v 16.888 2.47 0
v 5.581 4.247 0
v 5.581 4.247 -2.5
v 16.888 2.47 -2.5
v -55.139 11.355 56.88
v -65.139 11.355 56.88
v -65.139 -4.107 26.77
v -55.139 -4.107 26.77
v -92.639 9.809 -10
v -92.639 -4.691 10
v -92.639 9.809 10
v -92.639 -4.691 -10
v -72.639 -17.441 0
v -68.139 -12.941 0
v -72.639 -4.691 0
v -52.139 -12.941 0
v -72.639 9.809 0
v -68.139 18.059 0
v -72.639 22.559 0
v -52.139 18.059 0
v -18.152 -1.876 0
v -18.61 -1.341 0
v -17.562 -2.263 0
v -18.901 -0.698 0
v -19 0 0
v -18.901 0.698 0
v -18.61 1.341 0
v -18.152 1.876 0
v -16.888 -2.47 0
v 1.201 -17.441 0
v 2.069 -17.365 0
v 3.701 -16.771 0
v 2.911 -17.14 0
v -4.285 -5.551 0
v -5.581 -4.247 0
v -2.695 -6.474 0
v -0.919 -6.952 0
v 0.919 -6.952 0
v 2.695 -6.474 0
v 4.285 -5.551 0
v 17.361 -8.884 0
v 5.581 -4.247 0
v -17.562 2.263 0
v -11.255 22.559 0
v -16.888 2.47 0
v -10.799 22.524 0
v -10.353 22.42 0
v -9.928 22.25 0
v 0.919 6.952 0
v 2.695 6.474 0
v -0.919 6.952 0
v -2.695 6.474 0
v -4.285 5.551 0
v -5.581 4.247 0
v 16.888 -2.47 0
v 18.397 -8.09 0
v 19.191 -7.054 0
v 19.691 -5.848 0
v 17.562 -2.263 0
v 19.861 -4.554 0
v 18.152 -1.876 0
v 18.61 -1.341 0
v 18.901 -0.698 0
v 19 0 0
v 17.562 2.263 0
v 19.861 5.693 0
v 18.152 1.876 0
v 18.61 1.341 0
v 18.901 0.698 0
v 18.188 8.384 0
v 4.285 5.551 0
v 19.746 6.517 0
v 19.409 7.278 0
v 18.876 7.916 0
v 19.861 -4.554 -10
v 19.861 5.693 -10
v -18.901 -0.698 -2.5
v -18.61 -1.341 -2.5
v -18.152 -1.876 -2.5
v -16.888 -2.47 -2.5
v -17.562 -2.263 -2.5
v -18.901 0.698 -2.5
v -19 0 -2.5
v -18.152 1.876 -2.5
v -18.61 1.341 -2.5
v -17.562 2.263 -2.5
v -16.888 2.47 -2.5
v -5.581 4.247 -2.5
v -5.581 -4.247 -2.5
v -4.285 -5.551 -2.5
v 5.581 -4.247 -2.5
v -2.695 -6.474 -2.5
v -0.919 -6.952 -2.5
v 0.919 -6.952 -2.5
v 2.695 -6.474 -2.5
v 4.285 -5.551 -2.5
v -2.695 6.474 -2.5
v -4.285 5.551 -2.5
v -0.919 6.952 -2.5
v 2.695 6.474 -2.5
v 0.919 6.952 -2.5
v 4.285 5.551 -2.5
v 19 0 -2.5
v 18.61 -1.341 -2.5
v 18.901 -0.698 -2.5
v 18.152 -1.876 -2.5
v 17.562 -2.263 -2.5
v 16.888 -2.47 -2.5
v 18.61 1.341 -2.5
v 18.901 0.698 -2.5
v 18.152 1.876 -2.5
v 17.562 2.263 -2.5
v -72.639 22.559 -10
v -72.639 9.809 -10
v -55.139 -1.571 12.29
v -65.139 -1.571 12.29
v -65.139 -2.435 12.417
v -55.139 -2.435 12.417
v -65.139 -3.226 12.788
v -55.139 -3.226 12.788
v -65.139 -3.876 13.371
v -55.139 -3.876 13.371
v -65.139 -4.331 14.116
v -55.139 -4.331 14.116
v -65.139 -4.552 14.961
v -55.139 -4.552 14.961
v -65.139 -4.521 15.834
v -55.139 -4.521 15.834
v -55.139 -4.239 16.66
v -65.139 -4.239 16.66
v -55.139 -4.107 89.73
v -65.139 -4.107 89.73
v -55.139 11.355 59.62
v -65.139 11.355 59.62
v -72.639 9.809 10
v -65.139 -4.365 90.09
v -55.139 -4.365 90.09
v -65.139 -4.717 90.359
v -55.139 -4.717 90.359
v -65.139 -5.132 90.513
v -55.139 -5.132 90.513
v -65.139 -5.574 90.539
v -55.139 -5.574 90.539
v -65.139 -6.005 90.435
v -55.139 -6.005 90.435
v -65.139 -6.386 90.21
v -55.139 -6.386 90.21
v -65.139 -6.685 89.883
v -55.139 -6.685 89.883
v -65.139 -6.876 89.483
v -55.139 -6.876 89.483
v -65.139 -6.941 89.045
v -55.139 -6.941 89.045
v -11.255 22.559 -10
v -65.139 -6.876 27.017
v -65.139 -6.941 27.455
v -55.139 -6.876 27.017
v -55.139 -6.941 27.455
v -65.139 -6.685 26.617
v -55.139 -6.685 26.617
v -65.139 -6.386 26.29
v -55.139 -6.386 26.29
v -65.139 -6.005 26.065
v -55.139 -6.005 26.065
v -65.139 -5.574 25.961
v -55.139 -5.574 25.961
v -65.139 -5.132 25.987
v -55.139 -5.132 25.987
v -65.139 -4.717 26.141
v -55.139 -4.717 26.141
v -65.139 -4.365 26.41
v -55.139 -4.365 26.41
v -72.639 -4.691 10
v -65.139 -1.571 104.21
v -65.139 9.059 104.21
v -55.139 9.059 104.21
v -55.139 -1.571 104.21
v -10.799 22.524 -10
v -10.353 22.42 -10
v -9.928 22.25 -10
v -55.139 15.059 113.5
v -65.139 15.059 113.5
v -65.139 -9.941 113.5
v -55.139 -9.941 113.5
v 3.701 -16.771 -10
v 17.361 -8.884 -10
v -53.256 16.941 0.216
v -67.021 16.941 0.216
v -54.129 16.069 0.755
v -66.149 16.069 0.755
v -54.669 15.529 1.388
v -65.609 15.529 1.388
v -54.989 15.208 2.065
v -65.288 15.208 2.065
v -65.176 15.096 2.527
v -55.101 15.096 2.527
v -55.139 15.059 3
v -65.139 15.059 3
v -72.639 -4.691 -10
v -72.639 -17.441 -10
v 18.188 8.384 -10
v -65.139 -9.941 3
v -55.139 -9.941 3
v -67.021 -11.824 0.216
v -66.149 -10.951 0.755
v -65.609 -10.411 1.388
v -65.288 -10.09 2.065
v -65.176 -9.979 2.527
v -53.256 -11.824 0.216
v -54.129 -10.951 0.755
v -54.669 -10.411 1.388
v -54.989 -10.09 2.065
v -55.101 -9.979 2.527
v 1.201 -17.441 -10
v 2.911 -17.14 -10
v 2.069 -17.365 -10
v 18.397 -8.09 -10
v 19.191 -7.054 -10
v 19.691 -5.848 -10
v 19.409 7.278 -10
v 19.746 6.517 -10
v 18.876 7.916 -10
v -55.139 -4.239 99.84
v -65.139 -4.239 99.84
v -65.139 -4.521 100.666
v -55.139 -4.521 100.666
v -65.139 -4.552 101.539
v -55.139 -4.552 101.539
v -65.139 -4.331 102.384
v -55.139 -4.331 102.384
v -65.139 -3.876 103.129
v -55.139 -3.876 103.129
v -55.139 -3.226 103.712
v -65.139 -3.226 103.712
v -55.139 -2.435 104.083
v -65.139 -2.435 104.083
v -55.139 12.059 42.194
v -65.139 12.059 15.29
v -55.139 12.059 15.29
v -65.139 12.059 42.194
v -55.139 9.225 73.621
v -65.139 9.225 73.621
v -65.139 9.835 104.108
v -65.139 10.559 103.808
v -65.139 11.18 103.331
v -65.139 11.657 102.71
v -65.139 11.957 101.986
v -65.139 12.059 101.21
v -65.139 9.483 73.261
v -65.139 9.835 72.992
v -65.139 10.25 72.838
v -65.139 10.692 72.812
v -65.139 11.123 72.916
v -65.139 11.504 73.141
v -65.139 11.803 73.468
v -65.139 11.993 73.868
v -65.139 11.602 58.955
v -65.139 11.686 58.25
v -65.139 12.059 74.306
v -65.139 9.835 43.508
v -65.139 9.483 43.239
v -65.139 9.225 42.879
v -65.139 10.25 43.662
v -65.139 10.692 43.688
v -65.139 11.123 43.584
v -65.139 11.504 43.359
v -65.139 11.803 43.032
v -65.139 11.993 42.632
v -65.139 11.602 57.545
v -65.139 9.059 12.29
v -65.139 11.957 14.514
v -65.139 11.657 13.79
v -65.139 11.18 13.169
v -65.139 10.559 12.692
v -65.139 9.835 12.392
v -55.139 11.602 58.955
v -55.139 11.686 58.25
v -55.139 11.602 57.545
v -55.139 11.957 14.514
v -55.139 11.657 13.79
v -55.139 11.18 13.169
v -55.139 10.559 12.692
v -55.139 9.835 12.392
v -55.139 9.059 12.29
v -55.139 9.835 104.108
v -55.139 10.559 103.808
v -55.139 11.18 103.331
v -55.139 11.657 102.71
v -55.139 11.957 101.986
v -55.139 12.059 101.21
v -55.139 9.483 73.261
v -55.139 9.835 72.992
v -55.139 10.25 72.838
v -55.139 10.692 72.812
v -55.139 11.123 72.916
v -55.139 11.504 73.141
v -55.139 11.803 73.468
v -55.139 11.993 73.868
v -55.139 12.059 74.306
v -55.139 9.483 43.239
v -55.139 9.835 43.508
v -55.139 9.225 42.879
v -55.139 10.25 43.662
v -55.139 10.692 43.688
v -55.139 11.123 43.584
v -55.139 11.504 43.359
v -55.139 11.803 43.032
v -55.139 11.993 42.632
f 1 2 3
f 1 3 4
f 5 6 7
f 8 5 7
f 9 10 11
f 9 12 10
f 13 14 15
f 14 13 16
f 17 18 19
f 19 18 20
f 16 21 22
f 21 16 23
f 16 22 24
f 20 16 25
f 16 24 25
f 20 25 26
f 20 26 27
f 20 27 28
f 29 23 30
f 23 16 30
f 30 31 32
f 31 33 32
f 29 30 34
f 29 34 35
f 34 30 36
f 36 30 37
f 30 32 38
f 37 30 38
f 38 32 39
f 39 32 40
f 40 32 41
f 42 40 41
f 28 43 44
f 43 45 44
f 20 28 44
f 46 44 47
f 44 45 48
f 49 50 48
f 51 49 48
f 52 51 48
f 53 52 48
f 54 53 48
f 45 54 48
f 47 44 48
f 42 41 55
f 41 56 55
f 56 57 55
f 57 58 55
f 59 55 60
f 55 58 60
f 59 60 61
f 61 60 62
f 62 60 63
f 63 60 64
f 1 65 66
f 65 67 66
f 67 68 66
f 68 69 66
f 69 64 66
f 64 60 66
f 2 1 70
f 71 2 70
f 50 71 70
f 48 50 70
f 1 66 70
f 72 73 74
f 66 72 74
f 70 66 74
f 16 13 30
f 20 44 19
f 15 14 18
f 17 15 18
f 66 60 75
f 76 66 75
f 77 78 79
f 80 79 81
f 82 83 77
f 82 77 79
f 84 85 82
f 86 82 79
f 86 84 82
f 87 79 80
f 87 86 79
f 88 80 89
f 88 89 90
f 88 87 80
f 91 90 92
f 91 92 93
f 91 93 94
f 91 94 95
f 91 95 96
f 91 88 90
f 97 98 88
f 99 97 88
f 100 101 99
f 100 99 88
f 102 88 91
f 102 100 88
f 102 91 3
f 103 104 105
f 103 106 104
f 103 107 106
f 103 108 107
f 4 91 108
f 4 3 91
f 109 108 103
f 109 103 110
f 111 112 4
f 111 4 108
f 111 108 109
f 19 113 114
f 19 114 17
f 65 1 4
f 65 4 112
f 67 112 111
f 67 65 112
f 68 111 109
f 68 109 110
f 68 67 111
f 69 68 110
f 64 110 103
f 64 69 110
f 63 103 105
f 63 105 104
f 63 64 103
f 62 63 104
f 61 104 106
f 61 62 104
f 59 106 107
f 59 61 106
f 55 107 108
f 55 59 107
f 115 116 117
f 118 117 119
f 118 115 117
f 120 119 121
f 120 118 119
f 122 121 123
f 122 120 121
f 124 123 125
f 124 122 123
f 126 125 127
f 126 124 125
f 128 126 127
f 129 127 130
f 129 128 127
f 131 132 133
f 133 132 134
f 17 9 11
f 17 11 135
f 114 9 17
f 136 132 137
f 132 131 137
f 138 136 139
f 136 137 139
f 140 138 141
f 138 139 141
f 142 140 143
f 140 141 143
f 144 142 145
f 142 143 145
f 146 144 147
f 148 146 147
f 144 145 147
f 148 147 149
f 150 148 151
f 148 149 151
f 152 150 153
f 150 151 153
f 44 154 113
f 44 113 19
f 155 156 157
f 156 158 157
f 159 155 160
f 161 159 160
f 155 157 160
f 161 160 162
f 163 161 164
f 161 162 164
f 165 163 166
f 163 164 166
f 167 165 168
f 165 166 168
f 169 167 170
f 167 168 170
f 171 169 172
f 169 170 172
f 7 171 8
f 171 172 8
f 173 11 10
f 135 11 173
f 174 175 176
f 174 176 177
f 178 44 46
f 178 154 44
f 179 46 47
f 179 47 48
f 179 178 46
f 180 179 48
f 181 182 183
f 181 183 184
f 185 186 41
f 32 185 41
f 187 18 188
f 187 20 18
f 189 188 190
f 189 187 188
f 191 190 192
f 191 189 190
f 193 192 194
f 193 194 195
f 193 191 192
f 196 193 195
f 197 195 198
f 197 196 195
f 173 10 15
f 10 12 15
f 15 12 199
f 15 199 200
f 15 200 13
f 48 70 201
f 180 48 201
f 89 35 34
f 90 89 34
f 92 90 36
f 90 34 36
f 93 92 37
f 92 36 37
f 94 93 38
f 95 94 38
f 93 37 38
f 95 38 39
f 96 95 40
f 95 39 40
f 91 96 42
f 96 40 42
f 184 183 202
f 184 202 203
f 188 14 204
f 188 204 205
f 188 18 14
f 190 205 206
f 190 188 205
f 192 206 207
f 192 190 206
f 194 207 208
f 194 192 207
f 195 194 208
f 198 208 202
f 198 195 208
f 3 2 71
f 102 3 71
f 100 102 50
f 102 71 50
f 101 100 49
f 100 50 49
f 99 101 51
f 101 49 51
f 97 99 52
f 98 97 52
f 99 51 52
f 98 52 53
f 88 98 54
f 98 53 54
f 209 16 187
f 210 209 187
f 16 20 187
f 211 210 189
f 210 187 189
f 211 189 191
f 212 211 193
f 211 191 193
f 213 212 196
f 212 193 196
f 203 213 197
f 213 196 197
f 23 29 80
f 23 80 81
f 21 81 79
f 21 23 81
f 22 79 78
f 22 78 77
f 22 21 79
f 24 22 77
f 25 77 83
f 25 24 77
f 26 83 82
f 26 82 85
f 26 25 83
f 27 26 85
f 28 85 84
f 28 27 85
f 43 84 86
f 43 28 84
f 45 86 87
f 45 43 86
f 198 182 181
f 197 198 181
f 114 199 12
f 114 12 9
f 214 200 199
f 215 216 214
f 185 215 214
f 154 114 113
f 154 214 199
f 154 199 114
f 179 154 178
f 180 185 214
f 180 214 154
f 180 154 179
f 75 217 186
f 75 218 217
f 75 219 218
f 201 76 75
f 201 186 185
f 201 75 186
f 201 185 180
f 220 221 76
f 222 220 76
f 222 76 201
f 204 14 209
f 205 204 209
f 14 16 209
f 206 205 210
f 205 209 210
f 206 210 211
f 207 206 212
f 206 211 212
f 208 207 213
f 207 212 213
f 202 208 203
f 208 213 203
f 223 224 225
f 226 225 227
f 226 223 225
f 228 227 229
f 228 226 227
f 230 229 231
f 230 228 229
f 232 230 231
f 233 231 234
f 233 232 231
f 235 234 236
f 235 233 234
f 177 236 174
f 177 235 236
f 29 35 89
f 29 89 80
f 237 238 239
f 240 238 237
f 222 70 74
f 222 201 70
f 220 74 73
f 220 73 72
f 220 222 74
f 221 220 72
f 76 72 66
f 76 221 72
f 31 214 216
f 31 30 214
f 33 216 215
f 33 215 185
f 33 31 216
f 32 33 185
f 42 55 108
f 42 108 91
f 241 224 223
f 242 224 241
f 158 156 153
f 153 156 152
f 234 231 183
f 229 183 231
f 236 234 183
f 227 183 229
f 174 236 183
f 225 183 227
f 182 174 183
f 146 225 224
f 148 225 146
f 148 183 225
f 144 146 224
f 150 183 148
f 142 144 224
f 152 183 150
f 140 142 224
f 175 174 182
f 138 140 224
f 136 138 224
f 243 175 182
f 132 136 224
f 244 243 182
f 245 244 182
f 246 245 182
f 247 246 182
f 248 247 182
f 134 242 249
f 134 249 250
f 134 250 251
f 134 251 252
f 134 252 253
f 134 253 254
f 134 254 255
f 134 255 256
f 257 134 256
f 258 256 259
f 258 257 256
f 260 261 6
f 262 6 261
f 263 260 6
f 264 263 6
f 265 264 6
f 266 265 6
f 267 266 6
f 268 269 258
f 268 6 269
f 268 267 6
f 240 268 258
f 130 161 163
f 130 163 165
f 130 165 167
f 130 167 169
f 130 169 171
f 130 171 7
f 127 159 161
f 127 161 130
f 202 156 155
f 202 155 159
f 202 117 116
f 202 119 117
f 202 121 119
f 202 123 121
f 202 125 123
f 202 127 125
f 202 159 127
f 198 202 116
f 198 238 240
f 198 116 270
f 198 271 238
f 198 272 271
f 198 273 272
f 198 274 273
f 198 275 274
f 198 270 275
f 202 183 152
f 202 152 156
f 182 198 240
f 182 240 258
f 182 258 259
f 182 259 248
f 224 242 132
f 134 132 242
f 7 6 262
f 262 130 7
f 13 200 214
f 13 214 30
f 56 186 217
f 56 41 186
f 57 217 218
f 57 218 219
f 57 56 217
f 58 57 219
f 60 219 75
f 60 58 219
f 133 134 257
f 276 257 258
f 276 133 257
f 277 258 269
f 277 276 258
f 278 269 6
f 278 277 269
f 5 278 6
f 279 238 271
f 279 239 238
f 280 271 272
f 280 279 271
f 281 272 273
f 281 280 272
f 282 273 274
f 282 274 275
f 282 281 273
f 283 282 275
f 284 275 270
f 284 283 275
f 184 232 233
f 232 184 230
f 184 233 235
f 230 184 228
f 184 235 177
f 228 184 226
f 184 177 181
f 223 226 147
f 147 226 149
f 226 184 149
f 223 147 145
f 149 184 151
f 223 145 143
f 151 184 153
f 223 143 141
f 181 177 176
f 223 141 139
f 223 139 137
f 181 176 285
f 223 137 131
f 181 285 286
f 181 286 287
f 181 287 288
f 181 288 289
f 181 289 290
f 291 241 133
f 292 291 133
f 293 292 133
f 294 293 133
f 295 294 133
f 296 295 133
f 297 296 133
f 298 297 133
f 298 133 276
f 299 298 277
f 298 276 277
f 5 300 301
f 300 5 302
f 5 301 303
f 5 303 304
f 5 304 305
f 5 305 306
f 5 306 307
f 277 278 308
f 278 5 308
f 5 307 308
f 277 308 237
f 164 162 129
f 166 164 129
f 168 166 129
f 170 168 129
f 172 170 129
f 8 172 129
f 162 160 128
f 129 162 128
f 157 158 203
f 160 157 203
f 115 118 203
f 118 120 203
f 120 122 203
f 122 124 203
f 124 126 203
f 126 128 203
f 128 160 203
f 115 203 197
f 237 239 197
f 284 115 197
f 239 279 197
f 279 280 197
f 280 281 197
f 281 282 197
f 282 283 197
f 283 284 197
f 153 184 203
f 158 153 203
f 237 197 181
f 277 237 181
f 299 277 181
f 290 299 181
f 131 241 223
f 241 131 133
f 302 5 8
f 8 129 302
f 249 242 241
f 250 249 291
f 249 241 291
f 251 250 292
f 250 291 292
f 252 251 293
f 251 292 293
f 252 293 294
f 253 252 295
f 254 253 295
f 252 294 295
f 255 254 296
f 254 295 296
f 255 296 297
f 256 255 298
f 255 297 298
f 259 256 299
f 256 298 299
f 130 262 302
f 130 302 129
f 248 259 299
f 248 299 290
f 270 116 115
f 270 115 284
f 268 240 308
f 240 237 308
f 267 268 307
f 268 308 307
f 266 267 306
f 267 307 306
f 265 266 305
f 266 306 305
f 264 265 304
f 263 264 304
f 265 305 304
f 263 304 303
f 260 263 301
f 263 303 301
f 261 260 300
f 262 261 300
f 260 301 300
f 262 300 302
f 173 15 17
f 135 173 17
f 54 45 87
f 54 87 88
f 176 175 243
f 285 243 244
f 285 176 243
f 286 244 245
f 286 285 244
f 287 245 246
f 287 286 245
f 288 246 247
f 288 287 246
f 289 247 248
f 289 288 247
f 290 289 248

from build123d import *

# Parameters (mm, degrees)
SKETCH3_W            = 42.5
SKETCH3_H            = 15
BOSS_EXTRUDE1_DEPTH  = 10
SKETCH2_R            = 7.012606221
CUT_EXTRUDE1_DEPTH   = 2.5
SKETCH11_W           = 42.5
SKETCH11_H           = 10
BOSS_EXTRUDE5_DEPTH  = 10
SKETCH14_W           = 42.5
SKETCH14_H           = 10
BOSS_EXTRUDE7_DEPTH  = 15
SKETCH20_W           = 10
SKETCH20_H           = 40
BOSS_EXTRUDE10_DEPTH = 50
SKETCH21_W           = 10
SKETCH21_H           = 25
BOSS_EXTRUDE11_DEPTH = 113.5
FILLET1_R            = 3
CHAMFER1_SIZE        = 15
CHAMFER1_SIZE2       = 30.41699103
FILLET2_R            = 3
CHAMFER2_SIZE        = 10
CHAMFER2_SIZE2       = 17.320508076
FILLET3_R            = 5
CUT_EXTRUDE2_DEPTH   = 144.583262507
FILLET4_R            = 3
FILLET5_R            = 1.5
SKETCH25_W           = 10
SKETCH25_H           = 14.5
BOSS_EXTRUDE12_DEPTH = 20
SKETCH26_W           = 20
SKETCH26_H           = 14.5
BOSS_EXTRUDE13_DEPTH = 10


with BuildPart() as part:
    # Sketch3 → Boss-Extrude1 (new body)
    with BuildSketch(Plane.XY):
        with Locations((-1.388845539, 0.05888455)):
            Rectangle(SKETCH3_W, SKETCH3_H)
    extrude(amount=-BOSS_EXTRUDE1_DEPTH)

    # Sketch2 → Cut-Extrude1 (cut)
    with BuildSketch(Plane.XY):
        Circle(SKETCH2_R)
        with BuildLine():
            Line((-16.888114198, 2.469689731), (-3.968626967, 4.5))
            ThreePointArc((-3.968626967, 4.5), (0, 6), (3.968626967, 4.5))
            Line((3.968626967, 4.5), (16.888114198, 2.469689731))
            ThreePointArc((16.888114198, 2.469689731), (19, 0), (16.888114198, -2.469689731))
            Line((16.888114198, -2.469689731), (3.968626967, -4.5))
            ThreePointArc((3.968626967, -4.5), (0, -6), (-3.968626967, -4.5))
            Line((-3.968626967, -4.5), (-16.888114198, -2.469689731))
            ThreePointArc((-16.888114198, -2.469689731), (-19, 0), (-16.888114198, 2.469689731))
        make_face()
    extrude(amount=-CUT_EXTRUDE1_DEPTH, mode=Mode.SUBTRACT)

    # Sketch11 → Boss-Extrude5 (add)
    with BuildSketch(Plane.XZ.offset(7.44111545)):
        with Locations((-1.388845539, -5)):
            Rectangle(SKETCH11_W, SKETCH11_H)
    extrude(amount=BOSS_EXTRUDE5_DEPTH)

    # Sketch14 → Boss-Extrude7 (add)
    with BuildSketch(Plane(origin=(0, 7.55888455, 0), x_dir=(1, 0, 0), z_dir=(0, 1, 0))):
        with Locations((-1.388845539, 5)):
            Rectangle(SKETCH14_W, SKETCH14_H)
    extrude(amount=BOSS_EXTRUDE7_DEPTH)

    # Sketch20 → Boss-Extrude10 (add)
    with BuildSketch(Plane.ZY.offset(22.638845539)):
        with Locations((-5, 2.55888455)):
            Rectangle(SKETCH20_W, SKETCH20_H)
    extrude(amount=BOSS_EXTRUDE10_DEPTH)

    # Sketch21 → Boss-Extrude11 (add)
    with BuildSketch(Plane.XY):
        with Locations((-60.138845539, 2.55888455)):
            Rectangle(SKETCH21_W, SKETCH21_H)
    extrude(amount=BOSS_EXTRUDE11_DEPTH)

    # Fillet1
    fillet1_edges = [part.edges().sort_by_distance(p)[0] for p in [
        (-65.138845539, 2.55888455, 0),
        (-60.138845539, -9.94111545, 0),
        (-55.138845539, 2.55888455, 0),
        (-60.138845539, 15.05888455, 0),
    ]]
    fillet(fillet1_edges, radius=FILLET1_R)

    # Chamfer1
    chamfer1_edges = [part.edges().sort_by_distance(p)[0] for p in [
        (19.861154461, 22.55888455, -5),
    ]]
    chamfer1_side = [part.faces().sort_by_distance(p)[0] for p in [
        (19.861154461, 2.55888455, -5),
    ]]
    chamfer(chamfer1_edges, length=CHAMFER1_SIZE, length2=CHAMFER1_SIZE2, reference=chamfer1_side[0])

    # Fillet2
    fillet2_edges = [part.edges().sort_by_distance(p)[0] for p in [
        (-10.555836569, 22.55888455, -5),
        (19.861154461, 7.55888455, -5),
    ]]
    fillet(fillet2_edges, radius=FILLET2_R)

    # Chamfer2
    chamfer2_edges = [part.edges().sort_by_distance(p)[0] for p in [
        (19.861154461, -17.44111545, -5),
    ]]
    chamfer2_side = [part.faces().sort_by_distance(p)[0] for p in [
        (19.861154461, -5.873875391, -5),
    ]]
    chamfer(chamfer2_edges, length=CHAMFER2_SIZE, length2=CHAMFER2_SIZE2, reference=chamfer2_side[0])

    # Fillet3
    fillet3_edges = [part.edges().sort_by_distance(p)[0] for p in [
        (2.540646385, -17.44111545, -5),
        (19.861154461, -7.44111545, -5),
    ]]
    fillet(fillet3_edges, radius=FILLET3_R)

    # Sketch24 → Cut-Extrude2 (cut, through all)
    with BuildSketch(Plane.ZY.offset(65.138845539)):
        Polygon((58.25, -6.94111545), (95.25, -6.94111545), (58.25, 12.05888455), (21.25, -6.94111545), align=None)
        Polygon((48.39896268, 12.05888455), (12.290027833, -6.483541453), (12.290027833, 12.05888455), align=None)
        Polygon((68.10103732, 12.05888455), (104.209972167, 12.05888455), (104.209972167, -6.483541453), align=None)
    extrude(amount=-CUT_EXTRUDE2_DEPTH, mode=Mode.SUBTRACT)

    # Fillet4
    fillet4_edges = [part.edges().sort_by_distance(p)[0] for p in [
        (-60.138845539, -6.483541453, 104.209972167),
        (-60.138845539, 12.05888455, 104.209972167),
        (-60.138845539, 12.05888455, 12.290027833),
        (-60.138845539, -6.483541453, 12.290027833),
        (-60.138845539, 12.05888455, 58.25),
    ]]
    fillet(fillet4_edges, radius=FILLET4_R)

    # Fillet5
    fillet5_edges = [part.edges().sort_by_distance(p)[0] for p in [
        (-60.138845539, 12.05888455, 68.10103732),
        (-60.138845539, 12.05888455, 48.39896268),
        (-60.138845539, -6.94111545, 21.25),
        (-60.138845539, -6.94111545, 95.25),
    ]]
    fillet(fillet5_edges, radius=FILLET5_R)

    # Sketch25 → Boss-Extrude12 (add)
    with BuildSketch(Plane.ZY.offset(72.638845539)):
        with Locations((-5, 2.55888455)):
            Rectangle(SKETCH25_W, SKETCH25_H)
    extrude(amount=BOSS_EXTRUDE12_DEPTH)

    # Sketch26 → Boss-Extrude13 (add)
    with BuildSketch(Plane.XY):
        with Locations((-82.638845539, 2.55888455)):
            Rectangle(SKETCH26_W, SKETCH26_H)
    extrude(amount=BOSS_EXTRUDE13_DEPTH)


solid = part.part
